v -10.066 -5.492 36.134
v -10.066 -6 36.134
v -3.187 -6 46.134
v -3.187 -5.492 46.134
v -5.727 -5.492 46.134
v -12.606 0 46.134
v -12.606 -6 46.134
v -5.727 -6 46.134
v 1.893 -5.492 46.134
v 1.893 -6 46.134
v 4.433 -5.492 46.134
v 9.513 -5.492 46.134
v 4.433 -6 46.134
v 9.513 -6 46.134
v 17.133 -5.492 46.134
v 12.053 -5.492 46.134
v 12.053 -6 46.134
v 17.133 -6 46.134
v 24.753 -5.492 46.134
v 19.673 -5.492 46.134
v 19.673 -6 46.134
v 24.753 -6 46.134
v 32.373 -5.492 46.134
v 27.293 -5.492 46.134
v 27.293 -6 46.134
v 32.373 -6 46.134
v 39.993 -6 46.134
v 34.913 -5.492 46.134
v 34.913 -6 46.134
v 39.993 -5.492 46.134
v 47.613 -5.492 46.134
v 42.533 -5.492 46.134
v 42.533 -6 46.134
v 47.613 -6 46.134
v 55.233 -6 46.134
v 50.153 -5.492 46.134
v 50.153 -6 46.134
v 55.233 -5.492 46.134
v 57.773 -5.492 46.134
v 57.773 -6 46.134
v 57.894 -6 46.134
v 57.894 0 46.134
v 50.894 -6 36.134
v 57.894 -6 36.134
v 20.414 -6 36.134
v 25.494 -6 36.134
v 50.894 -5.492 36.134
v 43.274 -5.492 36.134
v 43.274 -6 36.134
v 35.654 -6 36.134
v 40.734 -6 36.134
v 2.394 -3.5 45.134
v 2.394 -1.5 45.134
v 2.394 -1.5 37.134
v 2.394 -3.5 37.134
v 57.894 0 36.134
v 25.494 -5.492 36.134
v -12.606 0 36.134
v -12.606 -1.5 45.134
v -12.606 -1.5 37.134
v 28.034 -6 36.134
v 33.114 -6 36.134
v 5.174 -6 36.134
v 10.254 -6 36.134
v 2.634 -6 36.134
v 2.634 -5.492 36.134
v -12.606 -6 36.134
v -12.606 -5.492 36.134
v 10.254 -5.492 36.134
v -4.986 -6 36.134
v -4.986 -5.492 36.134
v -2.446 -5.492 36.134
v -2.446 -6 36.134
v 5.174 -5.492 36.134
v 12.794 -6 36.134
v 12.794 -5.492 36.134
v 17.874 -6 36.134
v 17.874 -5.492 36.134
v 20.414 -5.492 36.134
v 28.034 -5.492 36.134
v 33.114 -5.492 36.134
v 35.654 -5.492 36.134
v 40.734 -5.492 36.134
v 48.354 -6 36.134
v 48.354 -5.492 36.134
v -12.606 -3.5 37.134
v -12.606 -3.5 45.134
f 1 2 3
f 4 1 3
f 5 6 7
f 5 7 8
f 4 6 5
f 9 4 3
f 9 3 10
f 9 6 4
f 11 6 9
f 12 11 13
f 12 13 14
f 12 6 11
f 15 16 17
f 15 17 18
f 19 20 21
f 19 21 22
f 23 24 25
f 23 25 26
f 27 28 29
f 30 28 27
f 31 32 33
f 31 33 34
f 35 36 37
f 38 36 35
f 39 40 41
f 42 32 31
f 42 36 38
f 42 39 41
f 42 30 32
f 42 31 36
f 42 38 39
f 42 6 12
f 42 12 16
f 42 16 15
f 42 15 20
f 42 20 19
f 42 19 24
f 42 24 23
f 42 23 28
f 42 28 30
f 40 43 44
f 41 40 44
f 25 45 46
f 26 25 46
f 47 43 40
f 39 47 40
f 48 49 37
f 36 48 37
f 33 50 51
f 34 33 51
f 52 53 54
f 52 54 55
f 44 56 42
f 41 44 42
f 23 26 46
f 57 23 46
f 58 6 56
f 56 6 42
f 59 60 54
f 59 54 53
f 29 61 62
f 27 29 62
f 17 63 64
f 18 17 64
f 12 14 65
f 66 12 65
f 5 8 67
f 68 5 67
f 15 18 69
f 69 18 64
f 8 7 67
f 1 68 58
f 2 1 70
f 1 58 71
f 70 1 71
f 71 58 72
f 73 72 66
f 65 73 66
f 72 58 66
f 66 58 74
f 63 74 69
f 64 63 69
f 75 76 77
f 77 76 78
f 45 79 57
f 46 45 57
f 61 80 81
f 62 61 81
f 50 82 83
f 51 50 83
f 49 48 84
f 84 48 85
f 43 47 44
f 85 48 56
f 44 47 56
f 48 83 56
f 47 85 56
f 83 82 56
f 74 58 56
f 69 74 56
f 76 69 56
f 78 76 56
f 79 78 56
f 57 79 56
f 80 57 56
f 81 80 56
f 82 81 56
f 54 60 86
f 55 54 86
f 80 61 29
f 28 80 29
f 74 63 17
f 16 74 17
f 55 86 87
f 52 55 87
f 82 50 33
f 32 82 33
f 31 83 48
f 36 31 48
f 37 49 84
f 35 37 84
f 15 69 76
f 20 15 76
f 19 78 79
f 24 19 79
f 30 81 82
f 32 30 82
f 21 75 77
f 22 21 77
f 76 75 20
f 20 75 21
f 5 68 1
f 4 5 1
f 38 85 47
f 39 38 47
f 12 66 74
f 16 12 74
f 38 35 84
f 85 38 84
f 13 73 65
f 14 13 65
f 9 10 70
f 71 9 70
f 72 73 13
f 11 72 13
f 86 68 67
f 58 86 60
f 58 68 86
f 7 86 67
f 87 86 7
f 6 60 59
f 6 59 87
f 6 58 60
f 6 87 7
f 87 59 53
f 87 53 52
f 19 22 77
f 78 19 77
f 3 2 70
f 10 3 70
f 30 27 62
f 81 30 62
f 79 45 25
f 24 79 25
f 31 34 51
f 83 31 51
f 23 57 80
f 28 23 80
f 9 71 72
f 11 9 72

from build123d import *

# Parameters (mm, degrees)
F0_W     = 70.5
F0_H     = 10
F1_DEPTH = 6
F3_DEPTH = 0.508
F4_W     = 2
F4_H     = 8
F5_DEPTH = 15


with BuildPart() as f1:
    # F0 (on Front) → F1 (new body)
    with BuildSketch(Plane.XZ):
        with Locations((22.643538, 41.13415)):
            Rectangle(F0_W, F0_H)
    extrude(amount=F1_DEPTH)

    # F2 (on face) → F3 (cut)
    with BuildSketch(Plane.XZ.offset(6)):
        Polygon((-5.727013, 46.13415), (-12.606462, 36.13415), (-10.066462, 36.13415), (-3.187013, 46.13415), align=None)
        Polygon((4.432987, 46.13415), (1.892987, 46.13415), (-4.986462, 36.13415), (-2.446462, 36.13415), align=None)
        Polygon((12.052987, 46.13415), (9.512987, 46.13415), (2.633538, 36.13415), (5.173538, 36.13415), align=None)
        Polygon((19.672987, 46.13415), (17.132987, 46.13415), (10.253538, 36.13415), (12.793538, 36.13415), align=None)
        Polygon((27.292987, 46.13415), (24.752987, 46.13415), (17.873538, 36.13415), (20.413538, 36.13415), align=None)
        Polygon((34.912987, 46.13415), (32.372987, 46.13415), (25.493538, 36.13415), (28.033538, 36.13415), align=None)
        Polygon((42.532987, 46.13415), (39.992987, 46.13415), (33.113538, 36.13415), (35.653538, 36.13415), align=None)
        Polygon((50.152987, 46.13415), (47.612987, 46.13415), (40.733538, 36.13415), (43.273538, 36.13415), align=None)
        Polygon((57.772987, 46.13415), (55.232987, 46.13415), (48.353538, 36.13415), (50.893538, 36.13415), align=None)
    extrude(amount=-F3_DEPTH, mode=Mode.SUBTRACT)

    # F4 (on face) → F5 (cut)
    with BuildSketch(Plane(origin=(-12.606462, 0, 0), x_dir=(0, -1, 0), z_dir=(-1, 0, 0))):
        with Locations((2.5, 41.13415)):
            Rectangle(F4_W, F4_H)
    extrude(amount=-F5_DEPTH, mode=Mode.SUBTRACT)


solid = f1.part
